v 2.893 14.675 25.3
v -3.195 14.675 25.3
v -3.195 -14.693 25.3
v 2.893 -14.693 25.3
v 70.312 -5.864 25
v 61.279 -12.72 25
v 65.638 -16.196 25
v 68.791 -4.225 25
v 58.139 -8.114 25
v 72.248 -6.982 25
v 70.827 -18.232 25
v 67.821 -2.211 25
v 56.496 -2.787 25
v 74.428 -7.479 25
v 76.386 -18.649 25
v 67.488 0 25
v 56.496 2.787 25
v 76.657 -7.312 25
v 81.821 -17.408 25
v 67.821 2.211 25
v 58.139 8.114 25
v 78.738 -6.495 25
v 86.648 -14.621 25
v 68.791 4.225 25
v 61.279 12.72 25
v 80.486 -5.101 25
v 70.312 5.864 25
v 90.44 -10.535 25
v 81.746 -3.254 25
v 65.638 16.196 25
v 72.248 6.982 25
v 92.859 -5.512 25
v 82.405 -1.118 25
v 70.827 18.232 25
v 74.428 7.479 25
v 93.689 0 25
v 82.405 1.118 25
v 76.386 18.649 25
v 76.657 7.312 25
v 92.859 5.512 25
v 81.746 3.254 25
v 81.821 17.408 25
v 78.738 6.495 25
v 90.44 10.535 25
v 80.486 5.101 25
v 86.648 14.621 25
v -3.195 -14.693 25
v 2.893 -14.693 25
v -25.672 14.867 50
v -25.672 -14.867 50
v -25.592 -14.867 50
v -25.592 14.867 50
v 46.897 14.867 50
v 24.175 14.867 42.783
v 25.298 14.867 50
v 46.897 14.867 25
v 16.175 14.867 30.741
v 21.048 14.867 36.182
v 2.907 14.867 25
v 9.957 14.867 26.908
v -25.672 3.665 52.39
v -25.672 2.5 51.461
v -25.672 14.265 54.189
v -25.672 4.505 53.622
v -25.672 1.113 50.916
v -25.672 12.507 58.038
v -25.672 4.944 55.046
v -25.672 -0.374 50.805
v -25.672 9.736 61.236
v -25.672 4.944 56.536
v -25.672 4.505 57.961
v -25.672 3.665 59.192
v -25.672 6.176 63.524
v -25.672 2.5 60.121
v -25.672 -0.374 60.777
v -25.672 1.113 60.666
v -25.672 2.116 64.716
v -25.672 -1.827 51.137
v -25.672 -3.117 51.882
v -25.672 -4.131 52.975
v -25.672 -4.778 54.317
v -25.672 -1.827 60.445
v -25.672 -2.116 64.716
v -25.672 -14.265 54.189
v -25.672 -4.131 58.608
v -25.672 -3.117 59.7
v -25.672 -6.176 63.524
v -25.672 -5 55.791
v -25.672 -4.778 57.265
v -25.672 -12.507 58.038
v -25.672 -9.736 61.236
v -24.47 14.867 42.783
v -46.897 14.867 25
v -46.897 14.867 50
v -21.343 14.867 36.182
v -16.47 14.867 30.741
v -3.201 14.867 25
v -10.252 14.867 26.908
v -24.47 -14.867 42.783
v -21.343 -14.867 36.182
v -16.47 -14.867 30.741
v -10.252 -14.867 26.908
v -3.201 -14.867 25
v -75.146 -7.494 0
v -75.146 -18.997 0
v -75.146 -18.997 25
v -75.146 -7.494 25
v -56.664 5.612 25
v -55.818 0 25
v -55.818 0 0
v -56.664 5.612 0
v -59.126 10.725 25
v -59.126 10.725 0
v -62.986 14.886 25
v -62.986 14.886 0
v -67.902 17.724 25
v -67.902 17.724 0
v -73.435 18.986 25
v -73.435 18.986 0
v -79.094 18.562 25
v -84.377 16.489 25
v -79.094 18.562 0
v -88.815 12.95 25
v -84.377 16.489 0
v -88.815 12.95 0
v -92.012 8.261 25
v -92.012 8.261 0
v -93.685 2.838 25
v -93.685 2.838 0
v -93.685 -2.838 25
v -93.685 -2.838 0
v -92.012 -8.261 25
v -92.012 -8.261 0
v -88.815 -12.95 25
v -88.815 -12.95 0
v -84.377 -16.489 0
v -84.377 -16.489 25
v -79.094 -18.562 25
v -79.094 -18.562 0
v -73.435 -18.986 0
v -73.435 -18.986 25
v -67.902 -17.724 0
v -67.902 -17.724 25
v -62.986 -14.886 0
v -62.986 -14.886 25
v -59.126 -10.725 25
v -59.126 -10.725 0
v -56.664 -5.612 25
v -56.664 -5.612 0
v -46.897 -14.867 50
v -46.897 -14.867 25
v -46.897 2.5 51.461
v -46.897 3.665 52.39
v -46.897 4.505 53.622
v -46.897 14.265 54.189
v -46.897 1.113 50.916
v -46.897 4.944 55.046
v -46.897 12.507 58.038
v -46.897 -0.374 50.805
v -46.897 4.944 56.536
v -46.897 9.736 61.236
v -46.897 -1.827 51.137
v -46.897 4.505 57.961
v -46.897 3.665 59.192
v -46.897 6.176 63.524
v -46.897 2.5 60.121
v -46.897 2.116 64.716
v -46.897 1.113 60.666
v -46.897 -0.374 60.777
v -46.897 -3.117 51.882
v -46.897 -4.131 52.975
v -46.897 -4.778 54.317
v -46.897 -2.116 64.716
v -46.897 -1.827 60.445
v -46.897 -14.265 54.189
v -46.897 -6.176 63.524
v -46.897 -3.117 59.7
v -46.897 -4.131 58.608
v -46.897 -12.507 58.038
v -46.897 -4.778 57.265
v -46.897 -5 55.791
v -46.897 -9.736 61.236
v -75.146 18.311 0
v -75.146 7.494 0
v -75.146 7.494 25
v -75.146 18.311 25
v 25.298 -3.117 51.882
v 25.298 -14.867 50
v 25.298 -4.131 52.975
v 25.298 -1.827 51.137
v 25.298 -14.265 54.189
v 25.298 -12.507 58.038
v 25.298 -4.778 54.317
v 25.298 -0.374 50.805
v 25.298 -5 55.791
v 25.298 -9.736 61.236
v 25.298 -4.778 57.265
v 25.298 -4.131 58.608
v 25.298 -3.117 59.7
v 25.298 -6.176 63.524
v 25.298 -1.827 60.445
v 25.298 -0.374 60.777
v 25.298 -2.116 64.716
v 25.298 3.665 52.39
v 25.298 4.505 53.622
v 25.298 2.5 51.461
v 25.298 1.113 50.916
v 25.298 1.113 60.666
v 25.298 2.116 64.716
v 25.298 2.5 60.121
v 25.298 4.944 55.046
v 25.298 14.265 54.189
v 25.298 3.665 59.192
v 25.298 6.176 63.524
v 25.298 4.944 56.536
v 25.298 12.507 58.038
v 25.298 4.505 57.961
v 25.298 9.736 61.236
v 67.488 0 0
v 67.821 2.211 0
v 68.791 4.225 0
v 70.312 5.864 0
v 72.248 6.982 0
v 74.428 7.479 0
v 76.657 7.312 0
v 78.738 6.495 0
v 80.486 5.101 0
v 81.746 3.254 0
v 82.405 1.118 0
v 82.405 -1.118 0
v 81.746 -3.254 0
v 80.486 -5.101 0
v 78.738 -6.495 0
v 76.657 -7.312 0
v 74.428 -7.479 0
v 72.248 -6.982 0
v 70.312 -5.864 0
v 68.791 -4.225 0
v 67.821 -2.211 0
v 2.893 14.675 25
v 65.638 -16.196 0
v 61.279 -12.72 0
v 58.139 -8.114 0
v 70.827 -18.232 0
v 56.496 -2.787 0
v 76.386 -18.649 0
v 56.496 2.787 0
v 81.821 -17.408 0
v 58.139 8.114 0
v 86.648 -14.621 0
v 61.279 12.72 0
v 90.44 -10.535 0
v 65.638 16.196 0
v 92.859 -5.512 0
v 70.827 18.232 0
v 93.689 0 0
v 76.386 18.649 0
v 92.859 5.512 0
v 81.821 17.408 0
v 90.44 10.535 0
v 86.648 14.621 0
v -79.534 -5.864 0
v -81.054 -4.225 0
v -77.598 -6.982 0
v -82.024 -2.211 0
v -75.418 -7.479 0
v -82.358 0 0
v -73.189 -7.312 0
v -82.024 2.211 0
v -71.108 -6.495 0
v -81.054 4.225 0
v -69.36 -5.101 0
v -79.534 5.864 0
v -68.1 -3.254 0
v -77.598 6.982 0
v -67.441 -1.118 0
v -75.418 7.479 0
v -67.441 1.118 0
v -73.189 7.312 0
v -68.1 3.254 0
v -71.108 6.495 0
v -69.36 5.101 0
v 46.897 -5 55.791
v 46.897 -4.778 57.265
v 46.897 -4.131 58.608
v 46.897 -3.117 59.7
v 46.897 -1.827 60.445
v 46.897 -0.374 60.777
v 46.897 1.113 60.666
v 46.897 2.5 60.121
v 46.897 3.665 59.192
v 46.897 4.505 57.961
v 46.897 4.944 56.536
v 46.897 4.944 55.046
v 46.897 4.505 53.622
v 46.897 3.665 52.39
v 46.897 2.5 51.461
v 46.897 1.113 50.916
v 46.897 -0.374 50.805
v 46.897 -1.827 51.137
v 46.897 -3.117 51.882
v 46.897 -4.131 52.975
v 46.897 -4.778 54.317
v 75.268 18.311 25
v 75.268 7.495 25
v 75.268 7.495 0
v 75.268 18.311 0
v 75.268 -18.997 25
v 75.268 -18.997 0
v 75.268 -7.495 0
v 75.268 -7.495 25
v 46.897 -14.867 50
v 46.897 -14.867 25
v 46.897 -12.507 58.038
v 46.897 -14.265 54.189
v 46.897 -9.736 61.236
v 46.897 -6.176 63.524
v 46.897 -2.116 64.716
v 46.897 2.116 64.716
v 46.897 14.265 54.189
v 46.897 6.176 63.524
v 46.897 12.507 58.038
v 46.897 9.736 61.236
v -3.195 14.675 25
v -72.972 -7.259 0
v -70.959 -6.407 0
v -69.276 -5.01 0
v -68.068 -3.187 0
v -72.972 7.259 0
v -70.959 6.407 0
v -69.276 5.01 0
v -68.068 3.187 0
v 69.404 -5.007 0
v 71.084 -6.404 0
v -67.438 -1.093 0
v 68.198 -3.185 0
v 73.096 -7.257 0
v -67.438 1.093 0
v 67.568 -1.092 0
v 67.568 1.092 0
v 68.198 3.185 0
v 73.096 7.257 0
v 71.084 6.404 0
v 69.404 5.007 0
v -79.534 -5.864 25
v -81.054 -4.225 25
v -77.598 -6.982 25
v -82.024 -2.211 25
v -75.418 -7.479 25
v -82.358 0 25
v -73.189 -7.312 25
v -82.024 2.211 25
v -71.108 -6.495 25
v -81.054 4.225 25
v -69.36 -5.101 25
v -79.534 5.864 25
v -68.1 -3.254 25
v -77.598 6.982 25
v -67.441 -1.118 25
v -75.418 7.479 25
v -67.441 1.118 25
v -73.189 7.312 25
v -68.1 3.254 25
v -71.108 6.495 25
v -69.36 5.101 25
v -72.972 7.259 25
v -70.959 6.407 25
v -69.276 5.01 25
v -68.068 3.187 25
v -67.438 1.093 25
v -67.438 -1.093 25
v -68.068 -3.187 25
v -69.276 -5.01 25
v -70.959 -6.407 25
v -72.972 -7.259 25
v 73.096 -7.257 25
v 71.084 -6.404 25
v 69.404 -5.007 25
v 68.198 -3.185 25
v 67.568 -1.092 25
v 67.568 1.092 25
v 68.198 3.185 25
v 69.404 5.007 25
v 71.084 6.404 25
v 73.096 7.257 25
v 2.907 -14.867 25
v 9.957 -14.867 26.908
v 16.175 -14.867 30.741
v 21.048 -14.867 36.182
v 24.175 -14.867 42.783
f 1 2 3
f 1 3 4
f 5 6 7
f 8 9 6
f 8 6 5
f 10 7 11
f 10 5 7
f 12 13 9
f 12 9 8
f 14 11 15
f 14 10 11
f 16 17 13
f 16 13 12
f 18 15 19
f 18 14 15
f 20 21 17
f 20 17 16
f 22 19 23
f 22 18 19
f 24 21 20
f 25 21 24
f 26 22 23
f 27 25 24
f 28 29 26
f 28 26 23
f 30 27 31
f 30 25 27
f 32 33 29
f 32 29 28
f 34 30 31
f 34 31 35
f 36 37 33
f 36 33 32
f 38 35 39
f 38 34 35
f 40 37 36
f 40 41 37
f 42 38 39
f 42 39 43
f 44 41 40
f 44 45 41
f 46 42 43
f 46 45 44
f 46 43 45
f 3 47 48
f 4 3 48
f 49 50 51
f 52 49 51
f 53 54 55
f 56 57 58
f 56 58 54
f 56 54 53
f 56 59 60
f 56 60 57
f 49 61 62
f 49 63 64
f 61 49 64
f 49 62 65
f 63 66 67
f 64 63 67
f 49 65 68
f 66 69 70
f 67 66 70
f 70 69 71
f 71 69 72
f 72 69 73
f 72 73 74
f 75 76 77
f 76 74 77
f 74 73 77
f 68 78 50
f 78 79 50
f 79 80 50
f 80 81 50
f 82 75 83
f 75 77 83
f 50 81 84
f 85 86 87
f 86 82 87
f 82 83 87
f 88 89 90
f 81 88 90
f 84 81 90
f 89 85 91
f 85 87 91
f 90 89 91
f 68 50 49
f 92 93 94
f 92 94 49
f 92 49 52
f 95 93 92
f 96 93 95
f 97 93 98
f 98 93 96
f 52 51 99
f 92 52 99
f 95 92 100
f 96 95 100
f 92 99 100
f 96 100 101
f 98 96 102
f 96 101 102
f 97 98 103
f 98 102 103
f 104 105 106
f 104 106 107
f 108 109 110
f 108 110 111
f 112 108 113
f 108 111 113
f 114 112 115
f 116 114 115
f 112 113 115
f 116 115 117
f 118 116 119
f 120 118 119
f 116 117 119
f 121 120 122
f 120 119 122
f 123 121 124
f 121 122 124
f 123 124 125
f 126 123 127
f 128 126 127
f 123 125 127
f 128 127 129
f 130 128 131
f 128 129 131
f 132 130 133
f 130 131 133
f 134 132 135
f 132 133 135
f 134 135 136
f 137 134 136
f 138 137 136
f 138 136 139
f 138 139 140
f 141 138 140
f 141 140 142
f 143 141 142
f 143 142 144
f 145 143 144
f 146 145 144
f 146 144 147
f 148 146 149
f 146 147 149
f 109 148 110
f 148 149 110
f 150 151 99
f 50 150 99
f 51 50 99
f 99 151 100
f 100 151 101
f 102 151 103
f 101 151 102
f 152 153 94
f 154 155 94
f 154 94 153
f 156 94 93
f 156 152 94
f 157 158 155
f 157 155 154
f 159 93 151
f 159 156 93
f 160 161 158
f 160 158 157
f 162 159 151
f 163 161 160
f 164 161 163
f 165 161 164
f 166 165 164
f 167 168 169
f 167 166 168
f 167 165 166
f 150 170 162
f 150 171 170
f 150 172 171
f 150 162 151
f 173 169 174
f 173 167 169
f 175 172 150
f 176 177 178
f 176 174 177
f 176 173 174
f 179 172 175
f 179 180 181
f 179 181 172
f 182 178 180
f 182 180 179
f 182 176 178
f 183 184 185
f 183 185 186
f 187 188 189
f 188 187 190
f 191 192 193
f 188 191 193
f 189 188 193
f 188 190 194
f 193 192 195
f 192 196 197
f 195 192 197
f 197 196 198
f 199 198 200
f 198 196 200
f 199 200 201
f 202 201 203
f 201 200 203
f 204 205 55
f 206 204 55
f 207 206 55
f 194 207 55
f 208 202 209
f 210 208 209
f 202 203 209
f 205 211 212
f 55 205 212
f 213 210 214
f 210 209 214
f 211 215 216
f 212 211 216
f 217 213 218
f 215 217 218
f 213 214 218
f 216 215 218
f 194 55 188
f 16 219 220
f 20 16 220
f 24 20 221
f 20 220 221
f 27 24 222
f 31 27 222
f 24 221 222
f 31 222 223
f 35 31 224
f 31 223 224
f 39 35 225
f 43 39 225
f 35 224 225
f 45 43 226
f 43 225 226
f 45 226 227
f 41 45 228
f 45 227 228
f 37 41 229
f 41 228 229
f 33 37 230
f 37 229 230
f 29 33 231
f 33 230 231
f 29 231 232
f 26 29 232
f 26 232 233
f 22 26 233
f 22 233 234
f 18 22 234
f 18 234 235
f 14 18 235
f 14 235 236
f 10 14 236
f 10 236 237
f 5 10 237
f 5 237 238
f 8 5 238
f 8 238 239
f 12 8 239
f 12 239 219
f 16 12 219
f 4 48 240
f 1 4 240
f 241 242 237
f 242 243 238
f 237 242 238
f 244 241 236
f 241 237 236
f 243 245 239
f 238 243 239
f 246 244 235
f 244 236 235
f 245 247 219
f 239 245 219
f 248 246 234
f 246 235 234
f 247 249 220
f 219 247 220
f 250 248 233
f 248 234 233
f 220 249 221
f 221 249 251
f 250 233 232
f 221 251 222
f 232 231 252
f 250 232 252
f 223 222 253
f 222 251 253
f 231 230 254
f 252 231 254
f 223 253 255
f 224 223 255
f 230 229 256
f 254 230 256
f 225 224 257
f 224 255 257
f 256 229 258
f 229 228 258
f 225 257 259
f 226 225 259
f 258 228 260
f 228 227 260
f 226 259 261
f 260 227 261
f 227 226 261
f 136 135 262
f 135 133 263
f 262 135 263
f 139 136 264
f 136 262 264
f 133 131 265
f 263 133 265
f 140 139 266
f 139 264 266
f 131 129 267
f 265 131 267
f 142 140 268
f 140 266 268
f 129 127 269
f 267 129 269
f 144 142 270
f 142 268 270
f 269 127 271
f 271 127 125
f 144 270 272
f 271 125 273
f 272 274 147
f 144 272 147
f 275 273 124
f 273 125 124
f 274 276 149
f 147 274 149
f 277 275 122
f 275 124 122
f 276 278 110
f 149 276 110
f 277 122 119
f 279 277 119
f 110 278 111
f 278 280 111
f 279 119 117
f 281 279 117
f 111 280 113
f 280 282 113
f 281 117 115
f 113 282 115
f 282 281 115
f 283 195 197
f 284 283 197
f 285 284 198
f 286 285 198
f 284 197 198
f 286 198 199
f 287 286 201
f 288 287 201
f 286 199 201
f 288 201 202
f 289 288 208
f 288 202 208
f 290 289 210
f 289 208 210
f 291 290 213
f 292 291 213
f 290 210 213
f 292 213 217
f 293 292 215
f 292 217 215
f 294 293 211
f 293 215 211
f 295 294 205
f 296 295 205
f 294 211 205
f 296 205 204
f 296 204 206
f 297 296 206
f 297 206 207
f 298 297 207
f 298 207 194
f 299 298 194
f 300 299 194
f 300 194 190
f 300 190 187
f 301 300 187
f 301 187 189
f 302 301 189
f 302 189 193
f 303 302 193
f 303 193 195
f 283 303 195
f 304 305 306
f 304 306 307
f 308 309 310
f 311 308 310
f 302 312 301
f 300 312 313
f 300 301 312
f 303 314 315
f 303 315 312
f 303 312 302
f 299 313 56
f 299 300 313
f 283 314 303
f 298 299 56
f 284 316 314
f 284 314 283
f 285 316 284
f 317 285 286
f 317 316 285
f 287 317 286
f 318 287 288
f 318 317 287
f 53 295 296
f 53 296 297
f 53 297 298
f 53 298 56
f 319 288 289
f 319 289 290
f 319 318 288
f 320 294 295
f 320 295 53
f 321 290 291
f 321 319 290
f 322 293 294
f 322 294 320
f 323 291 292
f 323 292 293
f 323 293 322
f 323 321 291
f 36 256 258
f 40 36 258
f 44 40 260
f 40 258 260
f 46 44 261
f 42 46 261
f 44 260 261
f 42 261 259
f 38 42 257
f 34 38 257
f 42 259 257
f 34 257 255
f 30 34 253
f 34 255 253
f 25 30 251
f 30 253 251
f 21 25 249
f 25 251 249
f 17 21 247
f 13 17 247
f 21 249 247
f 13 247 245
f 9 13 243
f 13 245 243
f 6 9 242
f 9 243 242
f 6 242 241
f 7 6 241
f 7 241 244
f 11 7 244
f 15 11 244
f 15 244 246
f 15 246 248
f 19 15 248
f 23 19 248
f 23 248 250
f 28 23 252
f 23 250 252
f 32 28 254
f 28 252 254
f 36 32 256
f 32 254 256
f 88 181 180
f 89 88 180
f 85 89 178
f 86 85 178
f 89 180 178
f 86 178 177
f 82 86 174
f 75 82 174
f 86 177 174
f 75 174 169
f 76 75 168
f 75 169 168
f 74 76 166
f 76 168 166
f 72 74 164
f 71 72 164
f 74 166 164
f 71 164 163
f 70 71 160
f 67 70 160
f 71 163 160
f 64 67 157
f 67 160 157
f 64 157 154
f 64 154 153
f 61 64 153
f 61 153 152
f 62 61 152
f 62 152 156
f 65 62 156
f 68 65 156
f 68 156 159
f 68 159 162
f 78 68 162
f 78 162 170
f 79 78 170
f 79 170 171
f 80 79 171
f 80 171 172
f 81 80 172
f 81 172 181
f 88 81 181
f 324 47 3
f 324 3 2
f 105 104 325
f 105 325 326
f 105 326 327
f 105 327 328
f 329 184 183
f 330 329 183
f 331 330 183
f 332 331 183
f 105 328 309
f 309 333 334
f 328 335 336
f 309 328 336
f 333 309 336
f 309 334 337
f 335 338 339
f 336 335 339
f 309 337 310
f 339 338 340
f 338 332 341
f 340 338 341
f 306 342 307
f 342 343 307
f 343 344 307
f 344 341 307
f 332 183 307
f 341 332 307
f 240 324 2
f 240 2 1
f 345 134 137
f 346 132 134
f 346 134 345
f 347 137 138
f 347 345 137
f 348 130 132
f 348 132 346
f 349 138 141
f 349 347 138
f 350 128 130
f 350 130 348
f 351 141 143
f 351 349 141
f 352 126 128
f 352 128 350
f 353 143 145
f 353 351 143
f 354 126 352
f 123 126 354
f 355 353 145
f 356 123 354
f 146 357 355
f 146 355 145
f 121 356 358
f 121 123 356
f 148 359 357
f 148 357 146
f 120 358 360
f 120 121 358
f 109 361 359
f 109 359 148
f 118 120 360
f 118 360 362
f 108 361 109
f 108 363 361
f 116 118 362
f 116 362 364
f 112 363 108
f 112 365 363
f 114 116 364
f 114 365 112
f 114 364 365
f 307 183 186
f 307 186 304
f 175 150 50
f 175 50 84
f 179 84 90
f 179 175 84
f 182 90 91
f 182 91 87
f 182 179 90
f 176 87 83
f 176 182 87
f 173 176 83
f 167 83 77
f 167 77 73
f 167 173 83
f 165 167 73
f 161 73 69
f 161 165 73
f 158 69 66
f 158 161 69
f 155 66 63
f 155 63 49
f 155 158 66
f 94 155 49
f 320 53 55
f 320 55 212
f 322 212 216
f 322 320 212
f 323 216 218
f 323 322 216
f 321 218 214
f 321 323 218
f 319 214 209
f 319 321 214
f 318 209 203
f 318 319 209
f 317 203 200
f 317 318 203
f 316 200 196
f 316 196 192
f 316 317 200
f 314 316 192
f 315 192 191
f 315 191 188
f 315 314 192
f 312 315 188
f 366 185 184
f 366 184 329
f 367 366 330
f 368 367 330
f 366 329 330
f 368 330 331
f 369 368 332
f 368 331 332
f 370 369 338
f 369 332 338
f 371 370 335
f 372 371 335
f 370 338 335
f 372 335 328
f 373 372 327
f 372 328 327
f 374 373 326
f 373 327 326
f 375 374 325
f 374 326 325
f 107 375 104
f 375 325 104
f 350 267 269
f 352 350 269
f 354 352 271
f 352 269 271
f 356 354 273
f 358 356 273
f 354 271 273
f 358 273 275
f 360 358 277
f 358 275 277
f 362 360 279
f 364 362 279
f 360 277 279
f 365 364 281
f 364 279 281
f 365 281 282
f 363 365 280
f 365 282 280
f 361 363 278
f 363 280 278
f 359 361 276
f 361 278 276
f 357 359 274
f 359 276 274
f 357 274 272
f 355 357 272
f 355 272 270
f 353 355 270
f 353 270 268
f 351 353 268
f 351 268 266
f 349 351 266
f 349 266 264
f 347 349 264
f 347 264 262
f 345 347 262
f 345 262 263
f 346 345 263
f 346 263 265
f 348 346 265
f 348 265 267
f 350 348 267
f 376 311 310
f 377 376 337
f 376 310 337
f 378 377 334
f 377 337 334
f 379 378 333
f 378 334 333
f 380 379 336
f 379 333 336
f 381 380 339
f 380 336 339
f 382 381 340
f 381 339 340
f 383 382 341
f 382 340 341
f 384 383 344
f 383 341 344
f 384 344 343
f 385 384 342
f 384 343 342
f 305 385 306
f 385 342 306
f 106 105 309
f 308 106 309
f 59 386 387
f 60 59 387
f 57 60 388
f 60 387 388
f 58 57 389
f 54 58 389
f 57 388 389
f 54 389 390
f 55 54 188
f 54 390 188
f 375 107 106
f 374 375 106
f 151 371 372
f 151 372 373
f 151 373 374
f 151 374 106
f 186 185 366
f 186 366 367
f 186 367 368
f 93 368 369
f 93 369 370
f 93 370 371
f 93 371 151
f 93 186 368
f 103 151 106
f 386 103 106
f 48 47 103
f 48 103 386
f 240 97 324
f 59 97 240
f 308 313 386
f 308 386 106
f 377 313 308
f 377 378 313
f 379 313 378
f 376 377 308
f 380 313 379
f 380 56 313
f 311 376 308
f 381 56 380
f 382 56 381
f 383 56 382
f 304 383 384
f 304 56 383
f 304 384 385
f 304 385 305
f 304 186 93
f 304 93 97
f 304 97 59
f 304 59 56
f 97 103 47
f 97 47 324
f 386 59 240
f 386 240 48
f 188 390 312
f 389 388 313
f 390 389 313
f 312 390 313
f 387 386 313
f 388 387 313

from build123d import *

# Parameters (mm, degrees)
F0_R      = 19.0397236597
F2_DEPTH  = 25
F1_R      = 18.7011614522
F3_W      = 150.4139229655
F3_H      = 37.3078882694
F4_DEPTH  = 25
F6_D      = 15
F6_2_D    = 15
F8_D      = 15
F8_2_D    = 15
F10_W     = 93.7936156988
F10_H     = 29.7349989414
F11_DEPTH = 25
F14_DEPTH = 21.5987153351
F16_DEPTH = 33.9082231304
F17_DEPTH = 21.2250072509
F20_D     = 10
F21_W     = 6.0876840726
F21_H     = 29.3677821755
F22_DEPTH = 0.3


with BuildPart() as f2:
    # F0 (on Top) → F2 (new body)
    with BuildSketch(Plane.XY):
        with Locations((-74.8575180769, 0)):
            Circle(F0_R)
    extrude(amount=F2_DEPTH)

    # F6 (through all)
    with Locations(Plane.XY.offset(25)):
        with Locations((-74.8575180769, 0)):
            Hole(F6_D / 2)


with BuildPart() as f2b:
    # F1 (on Top) → F2, piece 2 (new body)
    with BuildSketch(Plane.XY):
        with Locations((74.9882906675, 0)):
            Circle(F1_R)
    extrude(amount=F2_DEPTH)

    # F8 (through all)
    with Locations(Plane.XY.offset(25)):
        with Locations((74.9882906675, 0)):
            Hole(F8_D / 2)


with BuildPart() as f4:
    # F3 (on Top) → F4 (new body)
    with BuildSketch(Plane.XY):
        with Locations((0.0606141984, -0.342849642)):
            Rectangle(F3_W, F3_H)
    extrude(amount=F4_DEPTH)

    # F6#2 (through all)
    with Locations(Plane.XY.offset(25)):
        with Locations((-74.8575180769, 0)):
            Hole(F6_2_D / 2)

    # F8#2 (through all)
    with Locations(Plane.XY.offset(25)):
        with Locations((74.9882906675, 0)):
            Hole(F8_2_D / 2)

    # F10 (on face) → F11 (join)
    with BuildSketch(Plane.XY.offset(25)):
        Rectangle(F10_W, F10_H)
    extrude(amount=F11_DEPTH)

    # F12 (on face) → F14 (join)
    with BuildSketch(Plane.YZ.offset(46.8968078494)):
        with BuildLine():
            Line((-14.8674994707, 50), (14.8674994707, 50))
            ThreePointArc((14.8674994707, 50), (0, 64.8674994707), (-14.8674994707, 50))
        make_face()
    extrude(amount=-F14_DEPTH)

    # F15 (on face) → F16 (cut, through all)
    with BuildSketch(Plane.XZ.offset(14.8674994707)):
        with BuildLine():
            Line((25.2980925143, 50), (-25.5924705416, 50))
            ThreePointArc((-25.5924705416, 50), (-19.1023717702, 33.2853276971), (-3.2009568266, 25))
            Line((-3.2009568266, 25), (2.9065787992, 25))
            ThreePointArc((2.9065787992, 25), (18.8079937429, 33.2853276971), (25.2980925143, 50))
        make_face()
    extrude(amount=-F16_DEPTH, mode=Mode.SUBTRACT)

    # F13 (on face) → F17 (join)
    with BuildSketch(Plane(origin=(-46.8968078494, 0, 0), x_dir=(0, -1, 0), z_dir=(-1, 0, 0))):
        with BuildLine():
            Line((-14.8674994707, 50), (14.8674994707, 50))
            ThreePointArc((14.8674994707, 50), (0, 64.8674994707), (-14.8674994707, 50))
        make_face()
    extrude(amount=-F17_DEPTH)

    # F20 (through all)
    with Locations(Plane.YZ.offset(46.8968078494)):
        with Locations((0, 55.7911172509)):
            Hole(F20_D / 2)

    # F21 (on face) → F22 (join)
    with BuildSketch(Plane.XY.offset(25)):
        with Locations((-0.1512649469, -0.0088475645)):
            Rectangle(F21_W, F21_H)
    extrude(amount=F22_DEPTH)


solid = Compound([f2.part, f2b.part, f4.part])
